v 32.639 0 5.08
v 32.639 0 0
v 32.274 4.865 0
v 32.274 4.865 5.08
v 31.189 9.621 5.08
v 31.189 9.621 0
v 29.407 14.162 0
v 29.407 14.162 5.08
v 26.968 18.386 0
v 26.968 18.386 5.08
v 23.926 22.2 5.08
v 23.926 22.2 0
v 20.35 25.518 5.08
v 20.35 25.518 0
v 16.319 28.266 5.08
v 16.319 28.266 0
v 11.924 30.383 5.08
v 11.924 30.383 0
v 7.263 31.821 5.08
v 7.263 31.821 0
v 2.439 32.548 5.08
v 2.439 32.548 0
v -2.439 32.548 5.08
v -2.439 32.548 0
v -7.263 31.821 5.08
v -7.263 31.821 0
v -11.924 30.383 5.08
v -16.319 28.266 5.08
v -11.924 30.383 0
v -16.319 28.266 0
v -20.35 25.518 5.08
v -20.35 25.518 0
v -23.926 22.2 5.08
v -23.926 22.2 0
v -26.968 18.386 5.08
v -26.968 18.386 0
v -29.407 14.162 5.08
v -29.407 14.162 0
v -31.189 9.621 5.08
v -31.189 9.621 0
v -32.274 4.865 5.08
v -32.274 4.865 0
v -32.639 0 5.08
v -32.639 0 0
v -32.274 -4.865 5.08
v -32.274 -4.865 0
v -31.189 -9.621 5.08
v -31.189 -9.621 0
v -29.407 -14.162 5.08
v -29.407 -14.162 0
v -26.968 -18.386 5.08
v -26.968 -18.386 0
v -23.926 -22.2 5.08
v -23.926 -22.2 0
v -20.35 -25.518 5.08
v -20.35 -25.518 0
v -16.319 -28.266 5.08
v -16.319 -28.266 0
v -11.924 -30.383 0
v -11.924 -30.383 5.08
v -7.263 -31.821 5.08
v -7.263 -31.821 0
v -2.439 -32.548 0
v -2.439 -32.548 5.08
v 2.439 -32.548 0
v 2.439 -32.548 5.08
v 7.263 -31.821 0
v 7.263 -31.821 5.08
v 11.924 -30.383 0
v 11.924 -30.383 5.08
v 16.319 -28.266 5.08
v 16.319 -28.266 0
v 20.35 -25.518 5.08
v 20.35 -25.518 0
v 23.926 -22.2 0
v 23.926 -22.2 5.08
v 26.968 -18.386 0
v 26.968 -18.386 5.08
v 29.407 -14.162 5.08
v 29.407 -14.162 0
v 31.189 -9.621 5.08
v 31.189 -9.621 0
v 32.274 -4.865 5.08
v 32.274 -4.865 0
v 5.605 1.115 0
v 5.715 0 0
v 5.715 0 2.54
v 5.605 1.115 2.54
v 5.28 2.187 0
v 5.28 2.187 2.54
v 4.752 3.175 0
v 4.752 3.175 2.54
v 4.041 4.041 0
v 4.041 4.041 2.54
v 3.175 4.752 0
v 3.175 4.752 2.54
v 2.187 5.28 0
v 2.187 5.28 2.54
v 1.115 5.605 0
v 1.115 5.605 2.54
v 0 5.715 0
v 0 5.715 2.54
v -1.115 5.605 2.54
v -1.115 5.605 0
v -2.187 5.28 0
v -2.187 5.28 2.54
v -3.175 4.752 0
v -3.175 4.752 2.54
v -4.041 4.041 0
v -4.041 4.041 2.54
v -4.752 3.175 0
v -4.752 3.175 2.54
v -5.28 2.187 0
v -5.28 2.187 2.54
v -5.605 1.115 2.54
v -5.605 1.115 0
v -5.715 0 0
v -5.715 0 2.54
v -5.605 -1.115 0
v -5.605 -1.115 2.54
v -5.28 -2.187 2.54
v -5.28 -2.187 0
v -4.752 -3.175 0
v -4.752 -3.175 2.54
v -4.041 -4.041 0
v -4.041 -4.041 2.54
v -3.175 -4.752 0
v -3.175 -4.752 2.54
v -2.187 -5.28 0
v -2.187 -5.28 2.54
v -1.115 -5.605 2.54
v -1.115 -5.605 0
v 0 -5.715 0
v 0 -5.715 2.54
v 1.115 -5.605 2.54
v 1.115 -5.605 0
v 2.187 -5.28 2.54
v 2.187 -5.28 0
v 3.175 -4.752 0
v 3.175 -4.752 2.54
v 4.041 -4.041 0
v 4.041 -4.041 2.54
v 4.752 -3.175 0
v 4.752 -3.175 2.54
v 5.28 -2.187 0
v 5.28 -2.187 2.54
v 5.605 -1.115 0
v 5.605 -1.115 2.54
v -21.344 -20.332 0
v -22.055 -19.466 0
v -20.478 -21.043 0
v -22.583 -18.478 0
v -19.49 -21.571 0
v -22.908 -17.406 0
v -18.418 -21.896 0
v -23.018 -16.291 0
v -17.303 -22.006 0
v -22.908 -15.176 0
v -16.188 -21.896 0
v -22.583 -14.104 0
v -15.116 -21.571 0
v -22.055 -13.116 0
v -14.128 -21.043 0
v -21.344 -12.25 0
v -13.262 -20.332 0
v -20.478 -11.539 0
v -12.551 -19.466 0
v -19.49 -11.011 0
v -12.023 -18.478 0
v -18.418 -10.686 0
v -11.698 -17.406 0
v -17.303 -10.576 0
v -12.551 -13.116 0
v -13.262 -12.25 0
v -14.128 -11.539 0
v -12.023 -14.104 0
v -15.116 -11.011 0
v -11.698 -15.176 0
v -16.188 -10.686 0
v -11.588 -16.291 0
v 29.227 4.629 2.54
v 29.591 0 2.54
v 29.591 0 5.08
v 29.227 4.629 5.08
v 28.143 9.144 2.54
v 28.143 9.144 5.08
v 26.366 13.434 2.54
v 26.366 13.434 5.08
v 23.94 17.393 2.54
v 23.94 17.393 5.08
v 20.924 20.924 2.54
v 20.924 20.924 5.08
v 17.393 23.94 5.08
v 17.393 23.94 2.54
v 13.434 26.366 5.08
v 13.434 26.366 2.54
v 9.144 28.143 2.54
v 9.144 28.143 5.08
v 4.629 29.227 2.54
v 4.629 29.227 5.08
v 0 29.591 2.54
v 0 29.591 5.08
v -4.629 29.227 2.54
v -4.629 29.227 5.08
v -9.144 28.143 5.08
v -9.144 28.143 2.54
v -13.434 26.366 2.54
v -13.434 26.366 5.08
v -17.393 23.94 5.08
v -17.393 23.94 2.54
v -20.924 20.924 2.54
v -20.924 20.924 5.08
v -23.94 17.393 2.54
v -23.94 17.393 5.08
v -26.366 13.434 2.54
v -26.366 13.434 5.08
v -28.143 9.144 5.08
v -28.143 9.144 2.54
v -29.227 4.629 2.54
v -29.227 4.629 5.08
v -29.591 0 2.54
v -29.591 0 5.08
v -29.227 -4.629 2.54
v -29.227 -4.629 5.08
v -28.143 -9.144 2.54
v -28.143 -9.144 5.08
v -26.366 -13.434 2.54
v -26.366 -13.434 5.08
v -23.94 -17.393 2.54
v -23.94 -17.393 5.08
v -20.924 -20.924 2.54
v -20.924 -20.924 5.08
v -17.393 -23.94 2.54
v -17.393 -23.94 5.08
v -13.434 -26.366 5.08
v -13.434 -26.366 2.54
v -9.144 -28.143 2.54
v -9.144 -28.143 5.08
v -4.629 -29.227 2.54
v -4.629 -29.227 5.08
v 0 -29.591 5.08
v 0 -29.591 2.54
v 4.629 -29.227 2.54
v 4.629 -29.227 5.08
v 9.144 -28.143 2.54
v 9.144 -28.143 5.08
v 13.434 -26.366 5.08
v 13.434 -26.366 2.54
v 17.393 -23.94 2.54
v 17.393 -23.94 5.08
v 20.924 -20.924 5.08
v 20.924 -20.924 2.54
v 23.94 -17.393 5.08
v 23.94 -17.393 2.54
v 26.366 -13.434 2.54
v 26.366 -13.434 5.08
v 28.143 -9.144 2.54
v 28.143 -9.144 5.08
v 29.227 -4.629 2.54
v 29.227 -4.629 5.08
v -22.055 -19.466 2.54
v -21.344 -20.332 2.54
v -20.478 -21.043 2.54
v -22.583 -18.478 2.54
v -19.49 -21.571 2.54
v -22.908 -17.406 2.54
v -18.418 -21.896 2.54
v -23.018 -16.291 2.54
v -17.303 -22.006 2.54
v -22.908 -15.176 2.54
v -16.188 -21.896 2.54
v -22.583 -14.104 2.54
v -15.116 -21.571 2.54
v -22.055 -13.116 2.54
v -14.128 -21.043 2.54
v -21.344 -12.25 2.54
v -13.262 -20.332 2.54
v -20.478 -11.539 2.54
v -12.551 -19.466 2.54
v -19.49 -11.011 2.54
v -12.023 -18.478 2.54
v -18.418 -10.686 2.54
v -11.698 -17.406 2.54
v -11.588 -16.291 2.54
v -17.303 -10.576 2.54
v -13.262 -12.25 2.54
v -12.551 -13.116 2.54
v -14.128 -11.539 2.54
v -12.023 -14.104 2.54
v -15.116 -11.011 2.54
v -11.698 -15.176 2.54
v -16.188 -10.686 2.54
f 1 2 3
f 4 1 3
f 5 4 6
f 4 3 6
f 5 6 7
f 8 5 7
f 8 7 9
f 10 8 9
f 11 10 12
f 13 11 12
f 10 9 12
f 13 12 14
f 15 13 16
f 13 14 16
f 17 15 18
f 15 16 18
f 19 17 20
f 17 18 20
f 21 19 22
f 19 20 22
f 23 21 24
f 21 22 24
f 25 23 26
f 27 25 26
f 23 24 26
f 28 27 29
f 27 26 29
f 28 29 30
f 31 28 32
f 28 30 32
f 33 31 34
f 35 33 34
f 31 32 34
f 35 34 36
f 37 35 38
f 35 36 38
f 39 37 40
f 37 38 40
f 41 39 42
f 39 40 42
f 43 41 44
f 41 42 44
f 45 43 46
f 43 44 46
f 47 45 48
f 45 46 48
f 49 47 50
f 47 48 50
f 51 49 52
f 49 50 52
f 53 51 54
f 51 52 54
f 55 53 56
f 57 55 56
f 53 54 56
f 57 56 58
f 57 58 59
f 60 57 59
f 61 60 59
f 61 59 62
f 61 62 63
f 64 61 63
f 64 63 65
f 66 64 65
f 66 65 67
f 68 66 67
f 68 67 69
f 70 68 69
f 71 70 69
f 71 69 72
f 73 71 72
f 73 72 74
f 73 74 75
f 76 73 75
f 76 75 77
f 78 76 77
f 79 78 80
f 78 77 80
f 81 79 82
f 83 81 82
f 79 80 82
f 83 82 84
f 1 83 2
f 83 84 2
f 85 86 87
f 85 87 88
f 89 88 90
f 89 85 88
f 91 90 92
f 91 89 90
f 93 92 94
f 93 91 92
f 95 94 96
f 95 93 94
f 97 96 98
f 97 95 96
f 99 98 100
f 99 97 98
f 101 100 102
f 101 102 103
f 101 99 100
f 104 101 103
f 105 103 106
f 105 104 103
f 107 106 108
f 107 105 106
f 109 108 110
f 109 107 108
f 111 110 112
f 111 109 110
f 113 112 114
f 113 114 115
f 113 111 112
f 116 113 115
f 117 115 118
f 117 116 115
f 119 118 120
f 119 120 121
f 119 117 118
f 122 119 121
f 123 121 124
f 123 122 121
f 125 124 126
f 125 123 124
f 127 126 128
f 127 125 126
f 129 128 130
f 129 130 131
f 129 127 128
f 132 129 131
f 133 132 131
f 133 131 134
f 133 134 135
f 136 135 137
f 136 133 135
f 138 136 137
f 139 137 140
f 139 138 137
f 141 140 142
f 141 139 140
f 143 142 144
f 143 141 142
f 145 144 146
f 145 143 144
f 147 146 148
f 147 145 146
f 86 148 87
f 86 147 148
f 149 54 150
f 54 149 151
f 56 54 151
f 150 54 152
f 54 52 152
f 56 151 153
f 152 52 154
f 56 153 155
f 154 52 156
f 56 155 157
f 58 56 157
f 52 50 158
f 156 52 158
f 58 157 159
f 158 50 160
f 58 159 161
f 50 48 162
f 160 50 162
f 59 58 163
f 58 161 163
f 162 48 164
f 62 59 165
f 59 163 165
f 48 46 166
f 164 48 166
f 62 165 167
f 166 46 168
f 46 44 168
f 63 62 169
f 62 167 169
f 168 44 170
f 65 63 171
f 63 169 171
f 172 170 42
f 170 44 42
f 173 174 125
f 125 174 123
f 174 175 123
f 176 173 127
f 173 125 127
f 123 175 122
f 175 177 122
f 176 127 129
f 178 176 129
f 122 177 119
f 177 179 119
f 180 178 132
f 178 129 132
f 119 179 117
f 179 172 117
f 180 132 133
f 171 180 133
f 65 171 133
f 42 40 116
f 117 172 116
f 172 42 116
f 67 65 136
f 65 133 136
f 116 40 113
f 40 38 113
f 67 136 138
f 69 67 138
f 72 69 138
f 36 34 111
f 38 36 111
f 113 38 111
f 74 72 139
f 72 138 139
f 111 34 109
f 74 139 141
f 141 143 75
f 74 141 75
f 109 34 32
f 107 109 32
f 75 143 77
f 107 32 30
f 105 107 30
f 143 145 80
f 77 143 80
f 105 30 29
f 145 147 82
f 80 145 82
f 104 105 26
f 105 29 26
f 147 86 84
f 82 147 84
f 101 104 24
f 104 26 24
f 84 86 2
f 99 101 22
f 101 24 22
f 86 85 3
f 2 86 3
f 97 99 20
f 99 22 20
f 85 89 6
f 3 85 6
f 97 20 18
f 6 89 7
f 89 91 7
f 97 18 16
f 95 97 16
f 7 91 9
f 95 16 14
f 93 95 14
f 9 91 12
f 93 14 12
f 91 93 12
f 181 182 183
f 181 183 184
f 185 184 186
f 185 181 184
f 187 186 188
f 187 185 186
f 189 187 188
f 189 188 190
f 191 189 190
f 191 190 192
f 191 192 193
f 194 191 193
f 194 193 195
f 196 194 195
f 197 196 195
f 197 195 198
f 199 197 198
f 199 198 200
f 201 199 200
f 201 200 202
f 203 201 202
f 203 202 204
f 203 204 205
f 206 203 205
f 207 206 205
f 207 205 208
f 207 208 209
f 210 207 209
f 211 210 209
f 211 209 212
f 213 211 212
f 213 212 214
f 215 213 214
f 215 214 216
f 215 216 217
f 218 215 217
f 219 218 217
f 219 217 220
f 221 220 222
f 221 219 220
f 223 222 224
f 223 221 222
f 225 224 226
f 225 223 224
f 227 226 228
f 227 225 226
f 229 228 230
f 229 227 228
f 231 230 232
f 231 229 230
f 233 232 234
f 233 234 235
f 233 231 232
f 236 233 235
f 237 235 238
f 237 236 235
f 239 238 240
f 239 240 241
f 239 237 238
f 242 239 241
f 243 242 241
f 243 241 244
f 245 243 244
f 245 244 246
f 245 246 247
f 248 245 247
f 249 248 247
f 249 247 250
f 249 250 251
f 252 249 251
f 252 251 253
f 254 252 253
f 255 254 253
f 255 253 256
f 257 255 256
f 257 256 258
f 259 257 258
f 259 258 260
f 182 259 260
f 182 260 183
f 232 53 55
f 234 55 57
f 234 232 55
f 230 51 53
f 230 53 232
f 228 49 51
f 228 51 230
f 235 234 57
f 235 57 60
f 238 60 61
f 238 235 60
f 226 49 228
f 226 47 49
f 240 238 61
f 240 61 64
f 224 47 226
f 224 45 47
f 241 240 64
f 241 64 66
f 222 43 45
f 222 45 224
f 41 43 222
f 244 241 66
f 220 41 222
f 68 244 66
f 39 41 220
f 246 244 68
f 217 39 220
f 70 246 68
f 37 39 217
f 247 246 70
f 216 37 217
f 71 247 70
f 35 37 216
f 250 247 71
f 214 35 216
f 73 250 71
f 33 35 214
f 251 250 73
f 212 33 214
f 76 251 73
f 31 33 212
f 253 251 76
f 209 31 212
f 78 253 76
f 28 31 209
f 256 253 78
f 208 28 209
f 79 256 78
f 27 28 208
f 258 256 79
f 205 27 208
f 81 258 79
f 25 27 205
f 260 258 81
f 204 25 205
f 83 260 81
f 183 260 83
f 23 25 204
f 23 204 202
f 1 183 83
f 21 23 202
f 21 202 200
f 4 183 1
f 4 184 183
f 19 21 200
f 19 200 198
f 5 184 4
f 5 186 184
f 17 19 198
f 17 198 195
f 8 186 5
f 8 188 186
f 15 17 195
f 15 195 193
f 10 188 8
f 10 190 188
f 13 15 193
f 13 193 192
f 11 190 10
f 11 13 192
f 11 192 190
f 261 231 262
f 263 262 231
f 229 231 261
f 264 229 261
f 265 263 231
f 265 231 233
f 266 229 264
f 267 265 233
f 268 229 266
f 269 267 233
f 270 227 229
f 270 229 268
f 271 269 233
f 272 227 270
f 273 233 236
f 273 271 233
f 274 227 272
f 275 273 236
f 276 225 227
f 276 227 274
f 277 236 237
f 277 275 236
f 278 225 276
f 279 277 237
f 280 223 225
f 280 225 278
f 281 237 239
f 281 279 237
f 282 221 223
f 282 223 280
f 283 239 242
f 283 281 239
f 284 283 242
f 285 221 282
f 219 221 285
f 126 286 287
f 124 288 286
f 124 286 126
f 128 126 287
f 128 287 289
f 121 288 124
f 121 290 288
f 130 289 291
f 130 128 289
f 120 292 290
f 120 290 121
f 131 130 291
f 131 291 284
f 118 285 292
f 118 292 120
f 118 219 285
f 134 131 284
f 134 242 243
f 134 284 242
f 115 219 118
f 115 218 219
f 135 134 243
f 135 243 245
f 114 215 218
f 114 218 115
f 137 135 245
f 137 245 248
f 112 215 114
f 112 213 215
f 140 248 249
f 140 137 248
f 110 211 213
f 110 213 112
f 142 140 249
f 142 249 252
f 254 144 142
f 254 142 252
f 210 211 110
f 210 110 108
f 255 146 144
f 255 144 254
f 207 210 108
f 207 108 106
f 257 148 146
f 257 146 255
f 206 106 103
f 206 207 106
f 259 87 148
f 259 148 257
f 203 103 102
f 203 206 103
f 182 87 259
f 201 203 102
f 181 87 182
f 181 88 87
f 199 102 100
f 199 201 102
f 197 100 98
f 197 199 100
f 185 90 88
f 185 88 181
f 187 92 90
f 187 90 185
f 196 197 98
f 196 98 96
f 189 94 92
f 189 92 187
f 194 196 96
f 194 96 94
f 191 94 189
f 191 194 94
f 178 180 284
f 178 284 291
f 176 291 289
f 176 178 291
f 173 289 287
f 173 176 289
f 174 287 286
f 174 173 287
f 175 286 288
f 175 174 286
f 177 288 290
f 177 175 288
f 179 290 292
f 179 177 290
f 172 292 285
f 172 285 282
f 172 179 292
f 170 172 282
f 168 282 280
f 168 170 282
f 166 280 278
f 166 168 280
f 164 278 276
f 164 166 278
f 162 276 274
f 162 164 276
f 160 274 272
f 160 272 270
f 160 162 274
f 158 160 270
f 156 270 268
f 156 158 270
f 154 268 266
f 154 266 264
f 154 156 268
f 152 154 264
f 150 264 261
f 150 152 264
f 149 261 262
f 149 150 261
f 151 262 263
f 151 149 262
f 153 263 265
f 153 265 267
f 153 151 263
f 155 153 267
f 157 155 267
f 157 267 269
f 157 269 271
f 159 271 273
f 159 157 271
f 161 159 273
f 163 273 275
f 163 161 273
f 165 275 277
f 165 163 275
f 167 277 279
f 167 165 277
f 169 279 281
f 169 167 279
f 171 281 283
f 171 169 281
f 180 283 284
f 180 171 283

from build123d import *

# Parameters (mm, degrees)
F0_R     = 32.639
F0_R_2   = 29.591
F1_DEPTH = 5.08
F0_R_3   = 5.715
F2_DEPTH = 2.54


with BuildPart() as f1:
    # F0 (on Top) → F1 (new body)
    with BuildSketch(Plane.XY):
        Circle(F0_R)
        Circle(F0_R_2, mode=Mode.SUBTRACT)
    extrude(amount=F1_DEPTH)

    # F0 (on Top) → F2 (join)
    with BuildSketch(Plane.XY):
        Circle(F0_R_2)
        with Locations((-17.302921, -16.291201)):
            Circle(F0_R_3, mode=Mode.SUBTRACT)
        Circle(F0_R_3, mode=Mode.SUBTRACT)
    extrude(amount=F2_DEPTH)


solid = f1.part
